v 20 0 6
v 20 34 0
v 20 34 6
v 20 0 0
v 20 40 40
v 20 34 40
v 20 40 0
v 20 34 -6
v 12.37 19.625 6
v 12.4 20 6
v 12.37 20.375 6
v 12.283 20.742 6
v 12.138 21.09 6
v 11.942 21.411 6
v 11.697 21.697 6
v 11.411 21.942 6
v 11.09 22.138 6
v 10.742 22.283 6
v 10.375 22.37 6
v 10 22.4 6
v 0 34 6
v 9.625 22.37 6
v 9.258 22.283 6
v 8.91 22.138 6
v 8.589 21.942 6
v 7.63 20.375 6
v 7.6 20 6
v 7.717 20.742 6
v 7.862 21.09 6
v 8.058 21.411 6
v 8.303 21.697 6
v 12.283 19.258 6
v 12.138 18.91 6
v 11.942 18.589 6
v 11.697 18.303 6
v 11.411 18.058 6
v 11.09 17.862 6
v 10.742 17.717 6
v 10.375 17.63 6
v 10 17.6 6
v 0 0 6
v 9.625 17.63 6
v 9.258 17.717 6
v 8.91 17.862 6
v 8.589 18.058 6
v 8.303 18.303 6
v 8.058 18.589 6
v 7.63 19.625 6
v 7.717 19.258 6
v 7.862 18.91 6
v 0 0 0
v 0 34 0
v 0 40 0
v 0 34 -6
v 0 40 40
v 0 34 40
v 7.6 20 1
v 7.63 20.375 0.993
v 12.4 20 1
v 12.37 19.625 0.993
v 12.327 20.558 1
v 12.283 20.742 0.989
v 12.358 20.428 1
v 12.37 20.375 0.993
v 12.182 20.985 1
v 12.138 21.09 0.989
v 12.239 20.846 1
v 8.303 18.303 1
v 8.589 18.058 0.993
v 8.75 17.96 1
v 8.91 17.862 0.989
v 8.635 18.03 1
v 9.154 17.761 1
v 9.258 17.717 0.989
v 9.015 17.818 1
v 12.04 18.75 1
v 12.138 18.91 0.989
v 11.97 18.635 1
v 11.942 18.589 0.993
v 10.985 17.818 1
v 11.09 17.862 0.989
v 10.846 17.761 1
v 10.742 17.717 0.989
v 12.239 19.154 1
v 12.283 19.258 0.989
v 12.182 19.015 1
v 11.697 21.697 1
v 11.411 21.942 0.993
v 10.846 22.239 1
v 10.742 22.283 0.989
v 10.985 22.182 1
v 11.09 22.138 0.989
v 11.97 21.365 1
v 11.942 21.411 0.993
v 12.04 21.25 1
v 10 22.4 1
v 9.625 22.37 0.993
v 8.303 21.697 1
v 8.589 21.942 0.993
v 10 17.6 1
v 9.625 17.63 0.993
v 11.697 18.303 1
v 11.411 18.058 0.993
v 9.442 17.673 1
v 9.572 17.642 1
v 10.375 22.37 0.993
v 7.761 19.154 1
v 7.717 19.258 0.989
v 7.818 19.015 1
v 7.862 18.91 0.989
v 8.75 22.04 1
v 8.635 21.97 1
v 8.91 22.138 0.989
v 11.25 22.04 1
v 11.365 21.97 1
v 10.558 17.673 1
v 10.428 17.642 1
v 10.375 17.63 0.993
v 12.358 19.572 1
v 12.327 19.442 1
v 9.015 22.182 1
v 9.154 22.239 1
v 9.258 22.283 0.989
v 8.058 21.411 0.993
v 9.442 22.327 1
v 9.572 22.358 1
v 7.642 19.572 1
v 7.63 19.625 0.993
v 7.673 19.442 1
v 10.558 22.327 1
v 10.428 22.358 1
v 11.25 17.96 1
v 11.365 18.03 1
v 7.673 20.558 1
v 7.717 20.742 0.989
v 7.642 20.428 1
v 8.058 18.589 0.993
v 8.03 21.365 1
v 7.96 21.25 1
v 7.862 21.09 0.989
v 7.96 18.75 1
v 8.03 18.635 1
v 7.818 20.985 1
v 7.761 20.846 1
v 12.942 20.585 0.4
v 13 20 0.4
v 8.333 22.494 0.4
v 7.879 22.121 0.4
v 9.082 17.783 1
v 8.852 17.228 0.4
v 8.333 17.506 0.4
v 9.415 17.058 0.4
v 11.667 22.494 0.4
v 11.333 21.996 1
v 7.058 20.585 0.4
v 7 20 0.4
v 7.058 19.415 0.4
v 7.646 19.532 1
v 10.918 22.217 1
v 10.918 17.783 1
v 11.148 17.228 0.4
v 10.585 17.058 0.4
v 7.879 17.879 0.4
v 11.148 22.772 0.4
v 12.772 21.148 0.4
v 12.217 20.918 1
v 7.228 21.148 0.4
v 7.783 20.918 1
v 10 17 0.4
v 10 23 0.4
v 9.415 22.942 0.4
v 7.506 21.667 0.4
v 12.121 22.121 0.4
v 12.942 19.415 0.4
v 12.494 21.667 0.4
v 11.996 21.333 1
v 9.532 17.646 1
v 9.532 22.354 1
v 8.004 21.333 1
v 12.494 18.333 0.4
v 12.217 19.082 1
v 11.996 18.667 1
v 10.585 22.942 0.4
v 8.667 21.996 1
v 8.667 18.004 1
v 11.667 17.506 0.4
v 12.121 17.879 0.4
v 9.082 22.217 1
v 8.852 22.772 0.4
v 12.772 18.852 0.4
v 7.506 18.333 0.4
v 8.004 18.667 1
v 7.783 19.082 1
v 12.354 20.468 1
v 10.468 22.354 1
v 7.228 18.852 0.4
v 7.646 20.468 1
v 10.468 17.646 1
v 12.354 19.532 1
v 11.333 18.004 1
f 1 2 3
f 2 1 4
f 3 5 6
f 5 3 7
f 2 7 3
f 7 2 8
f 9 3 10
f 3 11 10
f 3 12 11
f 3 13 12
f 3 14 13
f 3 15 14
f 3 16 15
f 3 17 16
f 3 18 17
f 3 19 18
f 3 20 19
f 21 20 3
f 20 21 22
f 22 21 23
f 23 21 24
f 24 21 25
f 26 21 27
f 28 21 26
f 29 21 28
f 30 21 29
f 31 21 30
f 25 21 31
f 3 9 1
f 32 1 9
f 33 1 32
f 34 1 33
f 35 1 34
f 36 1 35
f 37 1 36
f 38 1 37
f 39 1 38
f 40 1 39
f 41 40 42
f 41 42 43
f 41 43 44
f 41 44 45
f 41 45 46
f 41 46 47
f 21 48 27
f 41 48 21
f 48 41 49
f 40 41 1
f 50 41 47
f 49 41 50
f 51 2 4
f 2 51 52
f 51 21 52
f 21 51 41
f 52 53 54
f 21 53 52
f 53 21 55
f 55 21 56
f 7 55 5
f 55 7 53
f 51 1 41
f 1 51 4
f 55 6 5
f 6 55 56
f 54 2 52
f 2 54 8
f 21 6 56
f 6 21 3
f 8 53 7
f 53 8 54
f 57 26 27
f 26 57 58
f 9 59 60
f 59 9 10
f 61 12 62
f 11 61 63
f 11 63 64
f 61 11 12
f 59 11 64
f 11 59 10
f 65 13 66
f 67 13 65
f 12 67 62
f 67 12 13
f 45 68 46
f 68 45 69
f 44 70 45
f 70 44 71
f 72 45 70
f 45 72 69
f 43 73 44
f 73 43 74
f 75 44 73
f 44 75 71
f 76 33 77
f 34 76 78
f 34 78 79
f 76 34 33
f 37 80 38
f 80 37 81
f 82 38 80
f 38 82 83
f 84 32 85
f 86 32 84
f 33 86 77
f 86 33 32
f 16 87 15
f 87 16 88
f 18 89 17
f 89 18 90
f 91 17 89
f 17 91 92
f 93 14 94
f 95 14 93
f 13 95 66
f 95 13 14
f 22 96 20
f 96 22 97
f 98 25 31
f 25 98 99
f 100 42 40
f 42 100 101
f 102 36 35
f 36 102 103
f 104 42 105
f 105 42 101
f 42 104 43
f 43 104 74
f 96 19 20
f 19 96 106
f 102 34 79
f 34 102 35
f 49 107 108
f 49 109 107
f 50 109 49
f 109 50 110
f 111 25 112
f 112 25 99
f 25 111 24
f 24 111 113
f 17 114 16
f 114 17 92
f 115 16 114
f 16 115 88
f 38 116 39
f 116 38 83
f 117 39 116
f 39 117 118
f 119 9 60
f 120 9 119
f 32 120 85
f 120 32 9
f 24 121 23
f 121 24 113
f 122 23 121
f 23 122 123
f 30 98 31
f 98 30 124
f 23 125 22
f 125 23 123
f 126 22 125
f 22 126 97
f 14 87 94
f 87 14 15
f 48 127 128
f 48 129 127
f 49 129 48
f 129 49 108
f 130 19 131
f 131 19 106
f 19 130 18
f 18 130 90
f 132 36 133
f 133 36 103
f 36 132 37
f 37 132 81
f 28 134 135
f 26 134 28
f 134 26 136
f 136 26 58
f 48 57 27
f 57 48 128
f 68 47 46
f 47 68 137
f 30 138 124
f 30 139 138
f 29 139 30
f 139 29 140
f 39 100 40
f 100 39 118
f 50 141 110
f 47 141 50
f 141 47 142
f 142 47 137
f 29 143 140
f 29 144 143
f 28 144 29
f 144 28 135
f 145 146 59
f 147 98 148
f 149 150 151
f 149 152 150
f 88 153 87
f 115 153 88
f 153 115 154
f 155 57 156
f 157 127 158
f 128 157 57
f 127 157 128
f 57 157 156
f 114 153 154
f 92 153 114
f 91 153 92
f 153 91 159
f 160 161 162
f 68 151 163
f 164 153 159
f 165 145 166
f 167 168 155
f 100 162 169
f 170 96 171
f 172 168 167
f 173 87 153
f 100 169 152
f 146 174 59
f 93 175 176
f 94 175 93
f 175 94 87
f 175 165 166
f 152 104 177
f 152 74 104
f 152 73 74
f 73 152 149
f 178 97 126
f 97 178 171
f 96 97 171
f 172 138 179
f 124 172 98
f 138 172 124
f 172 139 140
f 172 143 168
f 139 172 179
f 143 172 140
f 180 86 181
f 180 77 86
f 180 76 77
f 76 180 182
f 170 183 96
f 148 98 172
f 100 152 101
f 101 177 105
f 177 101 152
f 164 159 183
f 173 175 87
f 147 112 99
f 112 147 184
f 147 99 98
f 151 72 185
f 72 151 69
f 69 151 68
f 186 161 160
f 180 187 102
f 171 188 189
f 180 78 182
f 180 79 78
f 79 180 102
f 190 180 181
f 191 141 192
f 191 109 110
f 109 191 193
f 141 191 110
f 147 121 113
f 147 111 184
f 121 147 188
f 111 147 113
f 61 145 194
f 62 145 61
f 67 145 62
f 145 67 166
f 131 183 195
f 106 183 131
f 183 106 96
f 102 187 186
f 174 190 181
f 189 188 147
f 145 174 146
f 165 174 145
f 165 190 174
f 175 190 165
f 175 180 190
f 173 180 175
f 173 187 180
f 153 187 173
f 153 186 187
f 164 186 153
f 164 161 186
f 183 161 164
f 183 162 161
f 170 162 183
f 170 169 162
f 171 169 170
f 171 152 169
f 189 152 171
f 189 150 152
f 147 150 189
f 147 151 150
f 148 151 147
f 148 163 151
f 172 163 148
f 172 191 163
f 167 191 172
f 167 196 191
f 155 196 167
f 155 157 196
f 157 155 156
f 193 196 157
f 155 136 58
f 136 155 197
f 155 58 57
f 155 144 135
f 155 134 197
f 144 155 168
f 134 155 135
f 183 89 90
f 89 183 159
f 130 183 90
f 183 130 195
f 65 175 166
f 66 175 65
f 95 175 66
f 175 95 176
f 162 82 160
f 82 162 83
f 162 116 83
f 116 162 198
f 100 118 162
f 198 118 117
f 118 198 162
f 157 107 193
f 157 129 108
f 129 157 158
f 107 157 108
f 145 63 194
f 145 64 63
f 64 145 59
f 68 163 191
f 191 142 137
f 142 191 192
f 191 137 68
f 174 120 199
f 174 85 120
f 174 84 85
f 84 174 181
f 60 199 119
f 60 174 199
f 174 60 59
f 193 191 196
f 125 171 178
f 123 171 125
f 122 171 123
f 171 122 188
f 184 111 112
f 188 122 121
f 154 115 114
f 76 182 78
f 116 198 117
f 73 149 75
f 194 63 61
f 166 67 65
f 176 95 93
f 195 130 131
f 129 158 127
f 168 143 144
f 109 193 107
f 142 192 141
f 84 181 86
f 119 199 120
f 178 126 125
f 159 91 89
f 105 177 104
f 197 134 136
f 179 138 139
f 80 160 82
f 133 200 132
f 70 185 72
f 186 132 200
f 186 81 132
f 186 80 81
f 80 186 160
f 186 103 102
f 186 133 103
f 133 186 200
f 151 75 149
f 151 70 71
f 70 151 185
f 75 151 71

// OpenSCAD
/*
  Parametric L-bracket for mounting solar panels to 2020 extrusion

  Generates two variants:
    standoff_mode="printed" → through-hole for machine screw
    standoff_mode="heatset" → blind hole sized for brass insert
  A variable of that name is passed in by the CI render script.
*/

size          = 40;           // leg length (mm)
thickness     = 6;            // plate thickness (mm)
beam_width    = 20;           // width to match 2020 extrusion (mm)
hole_offset   = [0,0];        // XY offset of mounting hole from centre (mm)
gusset        = true;         // add triangular support in inner corner

// insert / screw parameters
insert_od         = 5.0;      // brass insert outer Ø (mm)
insert_length     = 5.0;
insert_clearance  = 0.20;     // interference amount (mm)
insert_hole_diam  = insert_od - insert_clearance;
screw_clearance   = 5.2;      // through-hole Ø for M5 (mm)
chamfer           = 0.6;      // lead-in chamfer (mm)

assert(insert_length < thickness,
       "insert_length must be < thickness to maintain a blind hole");

// read from CLI (-D standoff_mode="printed"/"heatset")
standoff_mode = "heatset";

module l_bracket()
{
  difference() {
    /* build the two legs */
    union() {
      // base leg lying flat (XY plane)
      cube([beam_width, size, thickness]);

      // vertical leg (XZ plane)
      translate([0, size - thickness, 0])
        cube([beam_width, thickness, size]);

      // optional gusset to reinforce the corner
      if (gusset)
        translate([0, size - thickness, 0])
          rotate([0,90,0])
            linear_extrude(height=beam_width)
              polygon([[0,0],[thickness,0],[0,thickness]]);
    }

    /* drill hole at centre of base leg for mounting */
    translate([beam_width/2 + hole_offset[0],
              size/2       + hole_offset[1],
              0])
    {
      if (standoff_mode == "printed") {
        // through-hole
        cylinder(h=thickness + 0.2, r=screw_clearance/2, $fn=32);
      } else {
        // blind hole for insert
        translate([0,0,thickness - insert_length - 0.1])
          cylinder(h=insert_length + 0.2, r=insert_hole_diam/2, $fn=40);
        // chamfer
        translate([0,0,thickness - insert_length - chamfer])
          cylinder(h=chamfer, r1=insert_hole_diam/2 + chamfer, r2=insert_hole_diam/2, $fn=32);
      }
    }
  }
}

/* shift so bracket base sits on Z=0 */
l_bracket();
